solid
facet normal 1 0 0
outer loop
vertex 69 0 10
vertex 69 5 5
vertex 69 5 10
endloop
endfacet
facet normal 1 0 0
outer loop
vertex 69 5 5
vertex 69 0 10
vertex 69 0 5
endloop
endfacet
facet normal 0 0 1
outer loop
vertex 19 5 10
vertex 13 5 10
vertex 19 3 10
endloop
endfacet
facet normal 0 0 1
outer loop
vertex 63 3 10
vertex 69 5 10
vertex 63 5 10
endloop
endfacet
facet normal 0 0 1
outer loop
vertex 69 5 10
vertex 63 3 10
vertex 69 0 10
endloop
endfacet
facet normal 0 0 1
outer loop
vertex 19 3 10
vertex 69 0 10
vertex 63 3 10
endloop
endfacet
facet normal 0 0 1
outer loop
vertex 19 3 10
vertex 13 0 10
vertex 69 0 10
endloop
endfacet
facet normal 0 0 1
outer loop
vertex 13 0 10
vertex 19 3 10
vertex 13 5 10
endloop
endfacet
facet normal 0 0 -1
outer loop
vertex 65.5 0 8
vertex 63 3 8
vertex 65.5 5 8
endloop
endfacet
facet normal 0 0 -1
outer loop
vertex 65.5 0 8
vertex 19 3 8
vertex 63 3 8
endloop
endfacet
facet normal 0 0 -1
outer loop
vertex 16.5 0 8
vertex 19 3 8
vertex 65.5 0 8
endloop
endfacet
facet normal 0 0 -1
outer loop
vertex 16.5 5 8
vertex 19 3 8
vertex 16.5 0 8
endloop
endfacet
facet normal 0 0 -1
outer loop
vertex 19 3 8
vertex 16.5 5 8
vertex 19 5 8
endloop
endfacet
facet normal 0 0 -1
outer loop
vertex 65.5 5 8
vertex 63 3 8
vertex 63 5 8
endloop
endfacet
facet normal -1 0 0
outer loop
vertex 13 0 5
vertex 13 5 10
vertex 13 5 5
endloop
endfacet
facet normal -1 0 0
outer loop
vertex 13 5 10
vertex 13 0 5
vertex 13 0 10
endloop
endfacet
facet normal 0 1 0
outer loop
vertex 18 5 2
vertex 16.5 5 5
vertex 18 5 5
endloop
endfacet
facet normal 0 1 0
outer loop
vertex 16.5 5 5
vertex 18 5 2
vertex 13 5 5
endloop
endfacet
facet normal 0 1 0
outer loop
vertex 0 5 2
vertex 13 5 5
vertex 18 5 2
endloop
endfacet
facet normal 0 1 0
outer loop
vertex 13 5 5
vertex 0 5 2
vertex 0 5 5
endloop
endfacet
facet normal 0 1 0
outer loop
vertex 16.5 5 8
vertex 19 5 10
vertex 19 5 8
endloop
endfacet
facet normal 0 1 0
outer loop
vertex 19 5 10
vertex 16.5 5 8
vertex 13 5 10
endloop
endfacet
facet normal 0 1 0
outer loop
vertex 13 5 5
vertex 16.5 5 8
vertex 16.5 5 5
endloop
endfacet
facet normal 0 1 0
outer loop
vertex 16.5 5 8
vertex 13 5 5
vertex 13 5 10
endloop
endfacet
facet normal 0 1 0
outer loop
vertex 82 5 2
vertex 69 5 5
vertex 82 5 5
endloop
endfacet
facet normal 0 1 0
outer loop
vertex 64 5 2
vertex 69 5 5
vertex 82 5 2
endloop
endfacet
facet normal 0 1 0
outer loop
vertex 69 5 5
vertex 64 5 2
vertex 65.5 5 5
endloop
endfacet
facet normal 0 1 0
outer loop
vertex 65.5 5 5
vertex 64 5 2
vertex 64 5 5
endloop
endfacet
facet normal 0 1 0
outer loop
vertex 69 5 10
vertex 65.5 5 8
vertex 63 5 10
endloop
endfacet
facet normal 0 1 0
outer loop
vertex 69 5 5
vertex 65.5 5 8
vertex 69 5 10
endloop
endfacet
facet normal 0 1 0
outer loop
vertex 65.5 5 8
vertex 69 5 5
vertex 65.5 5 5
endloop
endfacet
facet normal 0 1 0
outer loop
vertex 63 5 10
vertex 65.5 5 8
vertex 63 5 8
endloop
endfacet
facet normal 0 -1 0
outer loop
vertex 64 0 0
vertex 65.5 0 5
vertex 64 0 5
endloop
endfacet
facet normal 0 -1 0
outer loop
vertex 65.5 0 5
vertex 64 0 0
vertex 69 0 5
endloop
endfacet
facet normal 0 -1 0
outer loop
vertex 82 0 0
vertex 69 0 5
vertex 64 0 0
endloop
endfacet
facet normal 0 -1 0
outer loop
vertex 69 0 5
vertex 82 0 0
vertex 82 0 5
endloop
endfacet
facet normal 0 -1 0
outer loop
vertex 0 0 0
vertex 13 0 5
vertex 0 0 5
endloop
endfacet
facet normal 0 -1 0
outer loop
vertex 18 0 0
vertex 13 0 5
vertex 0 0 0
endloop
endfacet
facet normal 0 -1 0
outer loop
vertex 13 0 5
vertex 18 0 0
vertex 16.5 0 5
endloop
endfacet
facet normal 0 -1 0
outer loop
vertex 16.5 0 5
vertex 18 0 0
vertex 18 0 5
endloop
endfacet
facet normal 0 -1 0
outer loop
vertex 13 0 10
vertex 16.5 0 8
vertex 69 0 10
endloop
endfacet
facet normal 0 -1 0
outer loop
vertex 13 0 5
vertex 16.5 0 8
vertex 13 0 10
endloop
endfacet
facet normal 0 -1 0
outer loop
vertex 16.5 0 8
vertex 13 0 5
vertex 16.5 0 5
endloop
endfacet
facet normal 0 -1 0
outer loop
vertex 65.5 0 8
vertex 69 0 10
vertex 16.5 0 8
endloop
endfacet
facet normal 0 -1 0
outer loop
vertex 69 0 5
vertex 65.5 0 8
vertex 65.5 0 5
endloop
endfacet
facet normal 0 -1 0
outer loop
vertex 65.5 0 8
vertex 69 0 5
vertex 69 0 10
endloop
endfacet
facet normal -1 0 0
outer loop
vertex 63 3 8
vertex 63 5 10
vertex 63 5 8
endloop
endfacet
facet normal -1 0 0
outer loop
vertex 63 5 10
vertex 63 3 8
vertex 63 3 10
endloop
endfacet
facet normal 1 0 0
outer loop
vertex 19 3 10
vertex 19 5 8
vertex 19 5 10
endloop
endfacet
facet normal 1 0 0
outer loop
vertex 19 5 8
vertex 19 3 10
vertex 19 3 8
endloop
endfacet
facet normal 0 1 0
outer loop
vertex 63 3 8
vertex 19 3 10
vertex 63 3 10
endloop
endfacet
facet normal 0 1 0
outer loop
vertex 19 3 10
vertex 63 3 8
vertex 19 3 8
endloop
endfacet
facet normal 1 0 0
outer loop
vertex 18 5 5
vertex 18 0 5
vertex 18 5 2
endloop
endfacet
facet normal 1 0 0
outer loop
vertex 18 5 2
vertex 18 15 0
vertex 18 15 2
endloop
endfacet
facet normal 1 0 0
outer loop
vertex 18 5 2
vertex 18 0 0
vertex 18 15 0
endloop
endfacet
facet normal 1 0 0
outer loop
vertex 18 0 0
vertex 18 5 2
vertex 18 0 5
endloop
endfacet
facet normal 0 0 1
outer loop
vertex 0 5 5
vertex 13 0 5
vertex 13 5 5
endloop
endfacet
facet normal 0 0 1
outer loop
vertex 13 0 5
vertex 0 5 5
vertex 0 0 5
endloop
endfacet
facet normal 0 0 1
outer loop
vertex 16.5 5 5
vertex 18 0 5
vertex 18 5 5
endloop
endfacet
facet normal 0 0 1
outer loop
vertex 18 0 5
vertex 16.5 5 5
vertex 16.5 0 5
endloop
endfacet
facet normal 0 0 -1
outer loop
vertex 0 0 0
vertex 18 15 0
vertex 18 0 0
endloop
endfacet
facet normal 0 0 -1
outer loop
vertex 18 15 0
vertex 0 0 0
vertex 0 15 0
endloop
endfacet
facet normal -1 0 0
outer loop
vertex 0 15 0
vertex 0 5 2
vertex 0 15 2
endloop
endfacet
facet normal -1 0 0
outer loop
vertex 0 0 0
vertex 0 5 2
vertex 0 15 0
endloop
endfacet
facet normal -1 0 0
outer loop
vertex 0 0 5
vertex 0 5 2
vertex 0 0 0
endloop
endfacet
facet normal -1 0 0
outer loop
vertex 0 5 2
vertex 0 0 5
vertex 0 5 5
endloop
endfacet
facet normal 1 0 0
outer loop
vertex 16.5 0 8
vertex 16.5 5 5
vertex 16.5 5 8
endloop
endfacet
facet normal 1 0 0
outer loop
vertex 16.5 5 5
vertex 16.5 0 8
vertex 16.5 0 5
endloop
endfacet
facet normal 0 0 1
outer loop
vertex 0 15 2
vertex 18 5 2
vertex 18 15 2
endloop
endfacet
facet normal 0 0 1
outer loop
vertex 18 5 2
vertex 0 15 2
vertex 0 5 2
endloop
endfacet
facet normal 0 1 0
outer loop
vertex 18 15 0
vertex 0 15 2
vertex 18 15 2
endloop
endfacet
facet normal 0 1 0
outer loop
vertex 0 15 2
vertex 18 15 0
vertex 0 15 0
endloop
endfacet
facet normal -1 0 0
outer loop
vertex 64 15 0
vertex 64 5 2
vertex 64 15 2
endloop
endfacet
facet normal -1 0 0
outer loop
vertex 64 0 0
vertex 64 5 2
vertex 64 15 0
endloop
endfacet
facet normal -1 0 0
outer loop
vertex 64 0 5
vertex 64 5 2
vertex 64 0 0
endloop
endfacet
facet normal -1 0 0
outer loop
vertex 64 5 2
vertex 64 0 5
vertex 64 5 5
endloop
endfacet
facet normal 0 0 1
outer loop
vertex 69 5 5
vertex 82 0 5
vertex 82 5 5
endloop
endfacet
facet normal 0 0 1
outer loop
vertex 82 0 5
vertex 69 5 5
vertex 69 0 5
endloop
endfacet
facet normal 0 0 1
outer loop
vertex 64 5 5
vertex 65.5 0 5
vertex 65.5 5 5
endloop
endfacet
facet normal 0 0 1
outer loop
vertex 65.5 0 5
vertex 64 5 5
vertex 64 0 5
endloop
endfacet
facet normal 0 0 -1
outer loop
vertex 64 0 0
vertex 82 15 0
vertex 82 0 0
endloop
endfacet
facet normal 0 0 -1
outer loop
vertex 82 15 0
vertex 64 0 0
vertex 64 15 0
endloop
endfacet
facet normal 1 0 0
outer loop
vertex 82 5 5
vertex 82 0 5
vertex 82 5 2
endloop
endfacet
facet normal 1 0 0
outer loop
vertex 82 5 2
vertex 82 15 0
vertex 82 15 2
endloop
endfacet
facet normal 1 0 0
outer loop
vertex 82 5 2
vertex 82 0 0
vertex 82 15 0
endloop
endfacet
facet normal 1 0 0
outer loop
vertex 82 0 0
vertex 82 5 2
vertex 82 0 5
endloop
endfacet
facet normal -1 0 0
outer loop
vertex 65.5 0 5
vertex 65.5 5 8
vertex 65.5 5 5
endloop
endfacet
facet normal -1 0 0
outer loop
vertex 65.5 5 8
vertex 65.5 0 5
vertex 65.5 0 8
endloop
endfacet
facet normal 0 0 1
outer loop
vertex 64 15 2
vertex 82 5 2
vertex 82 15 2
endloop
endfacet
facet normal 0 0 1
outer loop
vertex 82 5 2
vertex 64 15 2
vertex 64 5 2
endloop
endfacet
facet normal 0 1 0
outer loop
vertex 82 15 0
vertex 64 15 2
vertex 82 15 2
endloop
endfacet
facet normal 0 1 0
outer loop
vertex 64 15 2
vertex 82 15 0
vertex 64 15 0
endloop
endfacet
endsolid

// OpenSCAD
$fn=50;

module arm() {
    difference() {
        cube([56,5,2]);
        translate([6,3,-1])
            cube([44,3,4]);
    }
}


// version +1mm arm width, -1mm height
module foot() {
    cube([18,5,5]);

    translate([13,0,5])
        cube([3.5,5,3,]);
    
    cube([18,15,2]);
}

translate([13,0,8])
    arm();

foot();

//translate([59,0,0])
//translate([13,5,0])
//rotate(a=[0,0,-180])
mirror()
   translate([-82,0,0])
      foot();
